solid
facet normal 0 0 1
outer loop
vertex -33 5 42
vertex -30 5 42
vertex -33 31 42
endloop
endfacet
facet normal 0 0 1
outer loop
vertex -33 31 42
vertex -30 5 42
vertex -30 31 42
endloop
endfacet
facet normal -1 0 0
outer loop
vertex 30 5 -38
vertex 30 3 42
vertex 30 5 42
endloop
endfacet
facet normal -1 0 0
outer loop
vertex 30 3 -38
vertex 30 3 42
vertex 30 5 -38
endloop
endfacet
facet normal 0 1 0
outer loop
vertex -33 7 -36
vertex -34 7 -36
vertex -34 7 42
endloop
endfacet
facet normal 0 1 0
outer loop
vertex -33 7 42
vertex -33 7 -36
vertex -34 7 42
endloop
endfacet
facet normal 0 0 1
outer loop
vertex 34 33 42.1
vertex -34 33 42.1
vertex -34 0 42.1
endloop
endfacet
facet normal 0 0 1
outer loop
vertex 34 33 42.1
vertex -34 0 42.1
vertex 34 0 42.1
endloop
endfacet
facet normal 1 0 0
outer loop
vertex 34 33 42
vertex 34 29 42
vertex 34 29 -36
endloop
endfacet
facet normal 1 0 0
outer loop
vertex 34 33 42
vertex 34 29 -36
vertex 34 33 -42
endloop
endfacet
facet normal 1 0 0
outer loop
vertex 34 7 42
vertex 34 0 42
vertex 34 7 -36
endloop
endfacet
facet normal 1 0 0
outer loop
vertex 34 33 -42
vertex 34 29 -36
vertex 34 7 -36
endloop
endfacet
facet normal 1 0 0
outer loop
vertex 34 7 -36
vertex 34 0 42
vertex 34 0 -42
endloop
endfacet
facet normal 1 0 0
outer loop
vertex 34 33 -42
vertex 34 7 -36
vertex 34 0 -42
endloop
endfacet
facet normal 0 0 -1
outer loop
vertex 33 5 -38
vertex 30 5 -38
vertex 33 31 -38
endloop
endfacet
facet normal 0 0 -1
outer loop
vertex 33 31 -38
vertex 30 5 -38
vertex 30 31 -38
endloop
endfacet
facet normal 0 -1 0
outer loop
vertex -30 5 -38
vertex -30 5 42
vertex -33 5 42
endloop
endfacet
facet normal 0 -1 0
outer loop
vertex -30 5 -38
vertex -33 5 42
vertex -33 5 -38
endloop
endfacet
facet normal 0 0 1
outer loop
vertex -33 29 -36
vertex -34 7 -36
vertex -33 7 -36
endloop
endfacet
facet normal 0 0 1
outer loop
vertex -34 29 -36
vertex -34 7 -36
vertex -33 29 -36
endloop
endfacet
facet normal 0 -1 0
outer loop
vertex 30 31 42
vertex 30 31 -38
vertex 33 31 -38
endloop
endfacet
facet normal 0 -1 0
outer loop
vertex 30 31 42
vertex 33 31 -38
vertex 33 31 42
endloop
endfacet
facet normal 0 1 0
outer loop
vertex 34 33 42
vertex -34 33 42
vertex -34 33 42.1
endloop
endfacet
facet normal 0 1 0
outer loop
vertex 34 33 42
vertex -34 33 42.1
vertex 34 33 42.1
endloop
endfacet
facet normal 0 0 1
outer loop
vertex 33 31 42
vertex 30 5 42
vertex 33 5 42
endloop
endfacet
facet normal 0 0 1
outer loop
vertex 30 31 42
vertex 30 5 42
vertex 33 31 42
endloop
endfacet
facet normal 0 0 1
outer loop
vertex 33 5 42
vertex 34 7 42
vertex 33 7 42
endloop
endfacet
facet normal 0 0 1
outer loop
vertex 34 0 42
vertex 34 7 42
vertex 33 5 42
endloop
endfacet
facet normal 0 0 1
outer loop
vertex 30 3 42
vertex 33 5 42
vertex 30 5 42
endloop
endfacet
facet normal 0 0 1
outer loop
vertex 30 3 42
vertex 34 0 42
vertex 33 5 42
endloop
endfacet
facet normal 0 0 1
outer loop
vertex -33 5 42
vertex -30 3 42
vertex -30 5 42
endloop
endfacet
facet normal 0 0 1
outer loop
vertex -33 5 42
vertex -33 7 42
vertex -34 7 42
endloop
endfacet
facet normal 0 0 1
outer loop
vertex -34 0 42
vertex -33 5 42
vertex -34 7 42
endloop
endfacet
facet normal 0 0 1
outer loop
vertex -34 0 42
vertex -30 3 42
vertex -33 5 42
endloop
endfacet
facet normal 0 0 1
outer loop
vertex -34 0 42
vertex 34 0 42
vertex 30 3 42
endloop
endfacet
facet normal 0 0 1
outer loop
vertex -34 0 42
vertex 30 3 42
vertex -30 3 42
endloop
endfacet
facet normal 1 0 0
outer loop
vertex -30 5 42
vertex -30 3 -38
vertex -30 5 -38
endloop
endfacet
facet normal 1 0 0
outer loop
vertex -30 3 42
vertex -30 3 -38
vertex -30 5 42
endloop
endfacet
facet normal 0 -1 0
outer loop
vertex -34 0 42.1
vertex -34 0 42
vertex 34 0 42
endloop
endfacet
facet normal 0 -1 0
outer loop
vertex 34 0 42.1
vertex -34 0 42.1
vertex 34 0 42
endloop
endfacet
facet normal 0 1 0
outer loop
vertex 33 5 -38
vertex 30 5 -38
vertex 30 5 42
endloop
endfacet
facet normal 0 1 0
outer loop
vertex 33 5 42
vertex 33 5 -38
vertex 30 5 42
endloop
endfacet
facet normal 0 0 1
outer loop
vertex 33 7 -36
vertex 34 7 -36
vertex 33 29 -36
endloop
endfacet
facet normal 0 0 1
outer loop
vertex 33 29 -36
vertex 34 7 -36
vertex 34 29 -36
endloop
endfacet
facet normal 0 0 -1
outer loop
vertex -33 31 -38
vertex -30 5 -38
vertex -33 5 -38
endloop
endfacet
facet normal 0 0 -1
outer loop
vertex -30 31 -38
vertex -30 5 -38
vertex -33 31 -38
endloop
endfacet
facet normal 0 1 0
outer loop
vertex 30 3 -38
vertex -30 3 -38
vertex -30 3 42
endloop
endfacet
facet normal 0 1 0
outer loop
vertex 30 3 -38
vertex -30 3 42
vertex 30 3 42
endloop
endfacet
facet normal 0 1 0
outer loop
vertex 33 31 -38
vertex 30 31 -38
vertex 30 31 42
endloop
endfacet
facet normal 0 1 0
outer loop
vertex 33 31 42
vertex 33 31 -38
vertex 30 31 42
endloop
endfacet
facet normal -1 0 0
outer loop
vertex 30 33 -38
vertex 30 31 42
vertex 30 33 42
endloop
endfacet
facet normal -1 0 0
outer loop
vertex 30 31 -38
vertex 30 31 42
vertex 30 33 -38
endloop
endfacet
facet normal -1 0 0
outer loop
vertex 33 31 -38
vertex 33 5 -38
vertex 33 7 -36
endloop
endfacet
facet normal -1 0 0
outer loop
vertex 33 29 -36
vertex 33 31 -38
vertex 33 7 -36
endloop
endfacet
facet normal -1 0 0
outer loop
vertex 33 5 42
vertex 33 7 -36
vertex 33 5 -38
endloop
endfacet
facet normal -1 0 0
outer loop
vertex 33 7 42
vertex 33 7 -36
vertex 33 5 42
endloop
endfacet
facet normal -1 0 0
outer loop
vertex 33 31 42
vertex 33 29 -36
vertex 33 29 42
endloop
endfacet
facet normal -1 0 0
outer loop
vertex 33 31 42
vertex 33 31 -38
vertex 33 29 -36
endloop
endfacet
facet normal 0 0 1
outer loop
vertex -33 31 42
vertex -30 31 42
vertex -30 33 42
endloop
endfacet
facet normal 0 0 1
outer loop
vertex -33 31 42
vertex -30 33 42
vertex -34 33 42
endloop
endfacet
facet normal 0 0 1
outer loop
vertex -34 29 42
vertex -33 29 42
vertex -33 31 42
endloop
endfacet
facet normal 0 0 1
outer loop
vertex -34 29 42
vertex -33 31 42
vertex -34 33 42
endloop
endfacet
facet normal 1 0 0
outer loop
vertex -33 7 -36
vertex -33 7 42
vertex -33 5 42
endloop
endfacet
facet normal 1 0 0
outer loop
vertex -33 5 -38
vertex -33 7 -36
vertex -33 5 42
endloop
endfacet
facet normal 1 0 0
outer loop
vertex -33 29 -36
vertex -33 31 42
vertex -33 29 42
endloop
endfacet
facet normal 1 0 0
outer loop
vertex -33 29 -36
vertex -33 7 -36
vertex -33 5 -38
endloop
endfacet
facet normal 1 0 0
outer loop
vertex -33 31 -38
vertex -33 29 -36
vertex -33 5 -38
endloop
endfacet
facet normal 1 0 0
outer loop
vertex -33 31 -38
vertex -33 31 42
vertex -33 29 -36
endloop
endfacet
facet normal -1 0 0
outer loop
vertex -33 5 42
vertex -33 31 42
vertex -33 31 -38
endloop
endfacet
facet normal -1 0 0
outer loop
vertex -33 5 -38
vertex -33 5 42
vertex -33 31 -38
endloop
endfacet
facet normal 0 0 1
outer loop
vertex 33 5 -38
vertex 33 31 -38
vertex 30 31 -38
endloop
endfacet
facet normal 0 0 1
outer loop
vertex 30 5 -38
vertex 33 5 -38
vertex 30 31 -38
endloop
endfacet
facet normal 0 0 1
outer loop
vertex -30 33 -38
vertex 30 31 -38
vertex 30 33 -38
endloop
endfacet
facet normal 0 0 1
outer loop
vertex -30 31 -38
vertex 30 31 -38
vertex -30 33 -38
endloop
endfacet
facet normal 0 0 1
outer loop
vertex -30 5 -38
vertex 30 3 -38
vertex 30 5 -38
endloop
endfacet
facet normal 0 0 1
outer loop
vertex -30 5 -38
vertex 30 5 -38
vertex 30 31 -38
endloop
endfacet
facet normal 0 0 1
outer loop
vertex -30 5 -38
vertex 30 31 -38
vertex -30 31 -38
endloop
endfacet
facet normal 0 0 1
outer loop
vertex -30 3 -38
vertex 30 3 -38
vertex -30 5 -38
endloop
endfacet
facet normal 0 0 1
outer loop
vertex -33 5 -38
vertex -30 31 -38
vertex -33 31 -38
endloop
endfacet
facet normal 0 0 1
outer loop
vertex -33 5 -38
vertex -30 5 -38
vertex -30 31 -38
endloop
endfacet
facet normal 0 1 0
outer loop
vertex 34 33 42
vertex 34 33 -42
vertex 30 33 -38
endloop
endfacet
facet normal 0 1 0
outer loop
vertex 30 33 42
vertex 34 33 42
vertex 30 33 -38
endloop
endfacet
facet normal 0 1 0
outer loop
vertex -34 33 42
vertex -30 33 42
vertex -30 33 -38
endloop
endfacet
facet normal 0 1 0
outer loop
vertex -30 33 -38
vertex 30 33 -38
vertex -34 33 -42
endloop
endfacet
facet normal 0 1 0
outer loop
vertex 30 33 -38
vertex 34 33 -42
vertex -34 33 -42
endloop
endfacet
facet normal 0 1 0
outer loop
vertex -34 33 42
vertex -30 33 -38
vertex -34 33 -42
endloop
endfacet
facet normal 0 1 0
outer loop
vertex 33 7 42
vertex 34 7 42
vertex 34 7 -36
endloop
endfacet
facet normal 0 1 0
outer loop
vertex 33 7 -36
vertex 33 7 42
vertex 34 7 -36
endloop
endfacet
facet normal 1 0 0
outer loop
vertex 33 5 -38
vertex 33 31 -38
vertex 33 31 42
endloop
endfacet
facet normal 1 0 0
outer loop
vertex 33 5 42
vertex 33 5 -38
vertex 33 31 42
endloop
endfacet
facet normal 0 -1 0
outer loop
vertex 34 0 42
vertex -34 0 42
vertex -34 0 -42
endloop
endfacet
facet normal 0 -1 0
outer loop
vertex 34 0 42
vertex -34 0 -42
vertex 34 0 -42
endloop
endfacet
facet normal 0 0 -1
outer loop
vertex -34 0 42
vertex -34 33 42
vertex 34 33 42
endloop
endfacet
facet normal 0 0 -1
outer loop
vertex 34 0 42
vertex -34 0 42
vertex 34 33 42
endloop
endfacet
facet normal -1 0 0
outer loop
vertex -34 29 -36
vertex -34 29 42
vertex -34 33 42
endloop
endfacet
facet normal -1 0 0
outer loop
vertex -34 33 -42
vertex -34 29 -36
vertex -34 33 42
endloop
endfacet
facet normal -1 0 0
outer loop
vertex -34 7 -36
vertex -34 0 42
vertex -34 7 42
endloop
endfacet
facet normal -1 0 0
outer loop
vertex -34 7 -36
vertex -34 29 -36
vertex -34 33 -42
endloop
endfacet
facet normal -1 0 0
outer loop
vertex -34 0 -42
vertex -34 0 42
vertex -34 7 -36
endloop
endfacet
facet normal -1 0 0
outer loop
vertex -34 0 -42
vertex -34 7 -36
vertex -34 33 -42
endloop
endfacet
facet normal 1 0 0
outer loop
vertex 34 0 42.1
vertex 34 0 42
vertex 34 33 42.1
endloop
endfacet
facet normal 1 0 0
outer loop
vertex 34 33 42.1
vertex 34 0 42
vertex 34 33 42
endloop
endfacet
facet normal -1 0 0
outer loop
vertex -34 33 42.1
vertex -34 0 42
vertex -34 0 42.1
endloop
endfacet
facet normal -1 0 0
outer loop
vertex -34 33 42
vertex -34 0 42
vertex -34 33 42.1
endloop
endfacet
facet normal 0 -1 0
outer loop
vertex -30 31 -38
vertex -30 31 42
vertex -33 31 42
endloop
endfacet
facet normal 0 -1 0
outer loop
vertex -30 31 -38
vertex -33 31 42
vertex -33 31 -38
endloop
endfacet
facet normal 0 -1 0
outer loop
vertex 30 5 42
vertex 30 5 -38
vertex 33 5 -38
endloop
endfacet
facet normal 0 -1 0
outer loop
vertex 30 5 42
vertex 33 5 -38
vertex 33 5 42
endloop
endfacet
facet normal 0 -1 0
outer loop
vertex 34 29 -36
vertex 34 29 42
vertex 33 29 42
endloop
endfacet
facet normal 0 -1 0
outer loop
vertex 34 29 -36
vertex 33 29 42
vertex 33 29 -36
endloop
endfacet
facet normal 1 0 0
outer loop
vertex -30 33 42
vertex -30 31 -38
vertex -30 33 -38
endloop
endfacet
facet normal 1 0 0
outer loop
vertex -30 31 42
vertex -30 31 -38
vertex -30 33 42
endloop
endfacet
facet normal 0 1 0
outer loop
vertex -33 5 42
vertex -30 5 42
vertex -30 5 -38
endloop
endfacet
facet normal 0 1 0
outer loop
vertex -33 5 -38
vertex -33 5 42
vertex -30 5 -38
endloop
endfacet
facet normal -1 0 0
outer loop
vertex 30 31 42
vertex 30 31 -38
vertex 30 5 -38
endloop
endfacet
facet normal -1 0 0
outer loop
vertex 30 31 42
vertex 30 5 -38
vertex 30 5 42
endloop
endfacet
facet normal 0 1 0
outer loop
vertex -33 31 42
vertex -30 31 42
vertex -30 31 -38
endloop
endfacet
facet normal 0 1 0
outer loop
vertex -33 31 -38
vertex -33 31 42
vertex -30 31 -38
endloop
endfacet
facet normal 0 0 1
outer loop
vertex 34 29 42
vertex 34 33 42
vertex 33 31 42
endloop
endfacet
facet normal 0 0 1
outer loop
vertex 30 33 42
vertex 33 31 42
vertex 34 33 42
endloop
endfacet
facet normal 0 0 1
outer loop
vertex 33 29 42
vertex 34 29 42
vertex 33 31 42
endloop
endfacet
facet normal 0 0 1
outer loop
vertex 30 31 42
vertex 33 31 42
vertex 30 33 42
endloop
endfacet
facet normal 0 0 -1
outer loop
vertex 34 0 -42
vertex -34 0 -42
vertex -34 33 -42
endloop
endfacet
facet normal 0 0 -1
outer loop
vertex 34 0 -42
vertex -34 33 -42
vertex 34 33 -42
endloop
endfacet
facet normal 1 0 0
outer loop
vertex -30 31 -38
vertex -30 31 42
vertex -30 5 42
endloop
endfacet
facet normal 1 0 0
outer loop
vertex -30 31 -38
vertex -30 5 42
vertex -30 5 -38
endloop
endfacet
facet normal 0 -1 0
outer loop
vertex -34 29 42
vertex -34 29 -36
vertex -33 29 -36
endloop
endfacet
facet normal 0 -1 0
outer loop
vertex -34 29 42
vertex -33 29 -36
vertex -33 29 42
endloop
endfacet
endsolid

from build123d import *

# Parameters (mm, degrees)
SKETCH1_W           = 68
SKETCH1_H           = 84
BOSS_EXTRUDE1_DEPTH = 3
BOSS_EXTRUDE2_DEPTH = 30
SKETCH3_W           = 78
SKETCH3_H           = 22
CUT_EXTRUDE1_DEPTH  = 1
SKETCH4_W           = 80
SKETCH4_H           = 26
CUT_EXTRUDE2_DEPTH  = 3
SKETCH5_W           = 80
SKETCH5_H           = 26
CUT_EXTRUDE3_DEPTH  = 3
SKETCH7_W           = 78
SKETCH7_H           = 22
CUT_EXTRUDE4_DEPTH  = 1
SKETCH8_W           = 80
SKETCH8_H           = 26
BOSS_EXTRUDE4_DEPTH = 3
SKETCH9_W           = 80
SKETCH9_H           = 26
BOSS_EXTRUDE5_DEPTH = 3
SKETCH10_W          = 68
SKETCH10_H          = 33
BOSS_EXTRUDE6_DEPTH = 0.1


with BuildPart() as part:
    # Sketch1 → Boss-Extrude1 (new body)
    with BuildSketch(Plane(origin=(0, 0, 0), x_dir=(1, 0, 0), z_dir=(0, 1, 0))):
        Rectangle(SKETCH1_W, SKETCH1_H)
    extrude(amount=BOSS_EXTRUDE1_DEPTH)

    # Sketch2 → Boss-Extrude2 (add)
    with BuildSketch(Plane(origin=(0, 3, 0), x_dir=(1, 0, 0), z_dir=(0, 1, 0))):
        Polygon((-30, -42), (-34, -42), (-34, 42), (34, 42), (34, -42), (30, -42), (30, 38), (-30, 38), align=None)
    extrude(amount=BOSS_EXTRUDE2_DEPTH)

    # Sketch3 → Cut-Extrude1 (cut)
    with BuildSketch(Plane.ZY.offset(34)):
        with Locations((3, 18)):
            Rectangle(SKETCH3_W, SKETCH3_H)
    extrude(amount=-CUT_EXTRUDE1_DEPTH, mode=Mode.SUBTRACT)

    # Sketch4 → Cut-Extrude2 (cut)
    with BuildSketch(Plane(origin=(-30, 0, 0), x_dir=(0, 0, -1), z_dir=(1, 0, 0))):
        with Locations((-2, 18)):
            Rectangle(SKETCH4_W, SKETCH4_H)
    extrude(amount=-CUT_EXTRUDE2_DEPTH, mode=Mode.SUBTRACT)

    # Sketch5 → Cut-Extrude3 (cut)
    with BuildSketch(Plane.ZY.offset(-30)):
        with Locations((2, 18)):
            Rectangle(SKETCH5_W, SKETCH5_H)
    extrude(amount=-CUT_EXTRUDE3_DEPTH, mode=Mode.SUBTRACT)

    # Sketch7 → Cut-Extrude4 (cut)
    with BuildSketch(Plane(origin=(34, 0, 0), x_dir=(0, 0, -1), z_dir=(1, 0, 0))):
        with Locations((-3, 18)):
            Rectangle(SKETCH7_W, SKETCH7_H)
    extrude(amount=-CUT_EXTRUDE4_DEPTH, mode=Mode.SUBTRACT)


with BuildPart() as body_2:
    # Sketch8 → Boss-Extrude4 (new body)
    with BuildSketch(Plane(origin=(-30, 0, 0), x_dir=(0, 0, -1), z_dir=(1, 0, 0))):
        with Locations((-2, 18)):
            Rectangle(SKETCH8_W, SKETCH8_H)
    extrude(amount=-BOSS_EXTRUDE4_DEPTH)


with BuildPart() as body_3:
    # Sketch9 → Boss-Extrude5 (new body)
    with BuildSketch(Plane.ZY.offset(-30)):
        with Locations((2, 18)):
            Rectangle(SKETCH9_W, SKETCH9_H)
    extrude(amount=-BOSS_EXTRUDE5_DEPTH)


with BuildPart() as body_4:
    # Sketch10 → Boss-Extrude6 (new body)
    with BuildSketch(Plane.XY.offset(42)):
        with Locations((0, 16.5)):
            Rectangle(SKETCH10_W, SKETCH10_H)
    extrude(amount=BOSS_EXTRUDE6_DEPTH)


solid = Compound([part.part, body_2.part, body_3.part, body_4.part])
